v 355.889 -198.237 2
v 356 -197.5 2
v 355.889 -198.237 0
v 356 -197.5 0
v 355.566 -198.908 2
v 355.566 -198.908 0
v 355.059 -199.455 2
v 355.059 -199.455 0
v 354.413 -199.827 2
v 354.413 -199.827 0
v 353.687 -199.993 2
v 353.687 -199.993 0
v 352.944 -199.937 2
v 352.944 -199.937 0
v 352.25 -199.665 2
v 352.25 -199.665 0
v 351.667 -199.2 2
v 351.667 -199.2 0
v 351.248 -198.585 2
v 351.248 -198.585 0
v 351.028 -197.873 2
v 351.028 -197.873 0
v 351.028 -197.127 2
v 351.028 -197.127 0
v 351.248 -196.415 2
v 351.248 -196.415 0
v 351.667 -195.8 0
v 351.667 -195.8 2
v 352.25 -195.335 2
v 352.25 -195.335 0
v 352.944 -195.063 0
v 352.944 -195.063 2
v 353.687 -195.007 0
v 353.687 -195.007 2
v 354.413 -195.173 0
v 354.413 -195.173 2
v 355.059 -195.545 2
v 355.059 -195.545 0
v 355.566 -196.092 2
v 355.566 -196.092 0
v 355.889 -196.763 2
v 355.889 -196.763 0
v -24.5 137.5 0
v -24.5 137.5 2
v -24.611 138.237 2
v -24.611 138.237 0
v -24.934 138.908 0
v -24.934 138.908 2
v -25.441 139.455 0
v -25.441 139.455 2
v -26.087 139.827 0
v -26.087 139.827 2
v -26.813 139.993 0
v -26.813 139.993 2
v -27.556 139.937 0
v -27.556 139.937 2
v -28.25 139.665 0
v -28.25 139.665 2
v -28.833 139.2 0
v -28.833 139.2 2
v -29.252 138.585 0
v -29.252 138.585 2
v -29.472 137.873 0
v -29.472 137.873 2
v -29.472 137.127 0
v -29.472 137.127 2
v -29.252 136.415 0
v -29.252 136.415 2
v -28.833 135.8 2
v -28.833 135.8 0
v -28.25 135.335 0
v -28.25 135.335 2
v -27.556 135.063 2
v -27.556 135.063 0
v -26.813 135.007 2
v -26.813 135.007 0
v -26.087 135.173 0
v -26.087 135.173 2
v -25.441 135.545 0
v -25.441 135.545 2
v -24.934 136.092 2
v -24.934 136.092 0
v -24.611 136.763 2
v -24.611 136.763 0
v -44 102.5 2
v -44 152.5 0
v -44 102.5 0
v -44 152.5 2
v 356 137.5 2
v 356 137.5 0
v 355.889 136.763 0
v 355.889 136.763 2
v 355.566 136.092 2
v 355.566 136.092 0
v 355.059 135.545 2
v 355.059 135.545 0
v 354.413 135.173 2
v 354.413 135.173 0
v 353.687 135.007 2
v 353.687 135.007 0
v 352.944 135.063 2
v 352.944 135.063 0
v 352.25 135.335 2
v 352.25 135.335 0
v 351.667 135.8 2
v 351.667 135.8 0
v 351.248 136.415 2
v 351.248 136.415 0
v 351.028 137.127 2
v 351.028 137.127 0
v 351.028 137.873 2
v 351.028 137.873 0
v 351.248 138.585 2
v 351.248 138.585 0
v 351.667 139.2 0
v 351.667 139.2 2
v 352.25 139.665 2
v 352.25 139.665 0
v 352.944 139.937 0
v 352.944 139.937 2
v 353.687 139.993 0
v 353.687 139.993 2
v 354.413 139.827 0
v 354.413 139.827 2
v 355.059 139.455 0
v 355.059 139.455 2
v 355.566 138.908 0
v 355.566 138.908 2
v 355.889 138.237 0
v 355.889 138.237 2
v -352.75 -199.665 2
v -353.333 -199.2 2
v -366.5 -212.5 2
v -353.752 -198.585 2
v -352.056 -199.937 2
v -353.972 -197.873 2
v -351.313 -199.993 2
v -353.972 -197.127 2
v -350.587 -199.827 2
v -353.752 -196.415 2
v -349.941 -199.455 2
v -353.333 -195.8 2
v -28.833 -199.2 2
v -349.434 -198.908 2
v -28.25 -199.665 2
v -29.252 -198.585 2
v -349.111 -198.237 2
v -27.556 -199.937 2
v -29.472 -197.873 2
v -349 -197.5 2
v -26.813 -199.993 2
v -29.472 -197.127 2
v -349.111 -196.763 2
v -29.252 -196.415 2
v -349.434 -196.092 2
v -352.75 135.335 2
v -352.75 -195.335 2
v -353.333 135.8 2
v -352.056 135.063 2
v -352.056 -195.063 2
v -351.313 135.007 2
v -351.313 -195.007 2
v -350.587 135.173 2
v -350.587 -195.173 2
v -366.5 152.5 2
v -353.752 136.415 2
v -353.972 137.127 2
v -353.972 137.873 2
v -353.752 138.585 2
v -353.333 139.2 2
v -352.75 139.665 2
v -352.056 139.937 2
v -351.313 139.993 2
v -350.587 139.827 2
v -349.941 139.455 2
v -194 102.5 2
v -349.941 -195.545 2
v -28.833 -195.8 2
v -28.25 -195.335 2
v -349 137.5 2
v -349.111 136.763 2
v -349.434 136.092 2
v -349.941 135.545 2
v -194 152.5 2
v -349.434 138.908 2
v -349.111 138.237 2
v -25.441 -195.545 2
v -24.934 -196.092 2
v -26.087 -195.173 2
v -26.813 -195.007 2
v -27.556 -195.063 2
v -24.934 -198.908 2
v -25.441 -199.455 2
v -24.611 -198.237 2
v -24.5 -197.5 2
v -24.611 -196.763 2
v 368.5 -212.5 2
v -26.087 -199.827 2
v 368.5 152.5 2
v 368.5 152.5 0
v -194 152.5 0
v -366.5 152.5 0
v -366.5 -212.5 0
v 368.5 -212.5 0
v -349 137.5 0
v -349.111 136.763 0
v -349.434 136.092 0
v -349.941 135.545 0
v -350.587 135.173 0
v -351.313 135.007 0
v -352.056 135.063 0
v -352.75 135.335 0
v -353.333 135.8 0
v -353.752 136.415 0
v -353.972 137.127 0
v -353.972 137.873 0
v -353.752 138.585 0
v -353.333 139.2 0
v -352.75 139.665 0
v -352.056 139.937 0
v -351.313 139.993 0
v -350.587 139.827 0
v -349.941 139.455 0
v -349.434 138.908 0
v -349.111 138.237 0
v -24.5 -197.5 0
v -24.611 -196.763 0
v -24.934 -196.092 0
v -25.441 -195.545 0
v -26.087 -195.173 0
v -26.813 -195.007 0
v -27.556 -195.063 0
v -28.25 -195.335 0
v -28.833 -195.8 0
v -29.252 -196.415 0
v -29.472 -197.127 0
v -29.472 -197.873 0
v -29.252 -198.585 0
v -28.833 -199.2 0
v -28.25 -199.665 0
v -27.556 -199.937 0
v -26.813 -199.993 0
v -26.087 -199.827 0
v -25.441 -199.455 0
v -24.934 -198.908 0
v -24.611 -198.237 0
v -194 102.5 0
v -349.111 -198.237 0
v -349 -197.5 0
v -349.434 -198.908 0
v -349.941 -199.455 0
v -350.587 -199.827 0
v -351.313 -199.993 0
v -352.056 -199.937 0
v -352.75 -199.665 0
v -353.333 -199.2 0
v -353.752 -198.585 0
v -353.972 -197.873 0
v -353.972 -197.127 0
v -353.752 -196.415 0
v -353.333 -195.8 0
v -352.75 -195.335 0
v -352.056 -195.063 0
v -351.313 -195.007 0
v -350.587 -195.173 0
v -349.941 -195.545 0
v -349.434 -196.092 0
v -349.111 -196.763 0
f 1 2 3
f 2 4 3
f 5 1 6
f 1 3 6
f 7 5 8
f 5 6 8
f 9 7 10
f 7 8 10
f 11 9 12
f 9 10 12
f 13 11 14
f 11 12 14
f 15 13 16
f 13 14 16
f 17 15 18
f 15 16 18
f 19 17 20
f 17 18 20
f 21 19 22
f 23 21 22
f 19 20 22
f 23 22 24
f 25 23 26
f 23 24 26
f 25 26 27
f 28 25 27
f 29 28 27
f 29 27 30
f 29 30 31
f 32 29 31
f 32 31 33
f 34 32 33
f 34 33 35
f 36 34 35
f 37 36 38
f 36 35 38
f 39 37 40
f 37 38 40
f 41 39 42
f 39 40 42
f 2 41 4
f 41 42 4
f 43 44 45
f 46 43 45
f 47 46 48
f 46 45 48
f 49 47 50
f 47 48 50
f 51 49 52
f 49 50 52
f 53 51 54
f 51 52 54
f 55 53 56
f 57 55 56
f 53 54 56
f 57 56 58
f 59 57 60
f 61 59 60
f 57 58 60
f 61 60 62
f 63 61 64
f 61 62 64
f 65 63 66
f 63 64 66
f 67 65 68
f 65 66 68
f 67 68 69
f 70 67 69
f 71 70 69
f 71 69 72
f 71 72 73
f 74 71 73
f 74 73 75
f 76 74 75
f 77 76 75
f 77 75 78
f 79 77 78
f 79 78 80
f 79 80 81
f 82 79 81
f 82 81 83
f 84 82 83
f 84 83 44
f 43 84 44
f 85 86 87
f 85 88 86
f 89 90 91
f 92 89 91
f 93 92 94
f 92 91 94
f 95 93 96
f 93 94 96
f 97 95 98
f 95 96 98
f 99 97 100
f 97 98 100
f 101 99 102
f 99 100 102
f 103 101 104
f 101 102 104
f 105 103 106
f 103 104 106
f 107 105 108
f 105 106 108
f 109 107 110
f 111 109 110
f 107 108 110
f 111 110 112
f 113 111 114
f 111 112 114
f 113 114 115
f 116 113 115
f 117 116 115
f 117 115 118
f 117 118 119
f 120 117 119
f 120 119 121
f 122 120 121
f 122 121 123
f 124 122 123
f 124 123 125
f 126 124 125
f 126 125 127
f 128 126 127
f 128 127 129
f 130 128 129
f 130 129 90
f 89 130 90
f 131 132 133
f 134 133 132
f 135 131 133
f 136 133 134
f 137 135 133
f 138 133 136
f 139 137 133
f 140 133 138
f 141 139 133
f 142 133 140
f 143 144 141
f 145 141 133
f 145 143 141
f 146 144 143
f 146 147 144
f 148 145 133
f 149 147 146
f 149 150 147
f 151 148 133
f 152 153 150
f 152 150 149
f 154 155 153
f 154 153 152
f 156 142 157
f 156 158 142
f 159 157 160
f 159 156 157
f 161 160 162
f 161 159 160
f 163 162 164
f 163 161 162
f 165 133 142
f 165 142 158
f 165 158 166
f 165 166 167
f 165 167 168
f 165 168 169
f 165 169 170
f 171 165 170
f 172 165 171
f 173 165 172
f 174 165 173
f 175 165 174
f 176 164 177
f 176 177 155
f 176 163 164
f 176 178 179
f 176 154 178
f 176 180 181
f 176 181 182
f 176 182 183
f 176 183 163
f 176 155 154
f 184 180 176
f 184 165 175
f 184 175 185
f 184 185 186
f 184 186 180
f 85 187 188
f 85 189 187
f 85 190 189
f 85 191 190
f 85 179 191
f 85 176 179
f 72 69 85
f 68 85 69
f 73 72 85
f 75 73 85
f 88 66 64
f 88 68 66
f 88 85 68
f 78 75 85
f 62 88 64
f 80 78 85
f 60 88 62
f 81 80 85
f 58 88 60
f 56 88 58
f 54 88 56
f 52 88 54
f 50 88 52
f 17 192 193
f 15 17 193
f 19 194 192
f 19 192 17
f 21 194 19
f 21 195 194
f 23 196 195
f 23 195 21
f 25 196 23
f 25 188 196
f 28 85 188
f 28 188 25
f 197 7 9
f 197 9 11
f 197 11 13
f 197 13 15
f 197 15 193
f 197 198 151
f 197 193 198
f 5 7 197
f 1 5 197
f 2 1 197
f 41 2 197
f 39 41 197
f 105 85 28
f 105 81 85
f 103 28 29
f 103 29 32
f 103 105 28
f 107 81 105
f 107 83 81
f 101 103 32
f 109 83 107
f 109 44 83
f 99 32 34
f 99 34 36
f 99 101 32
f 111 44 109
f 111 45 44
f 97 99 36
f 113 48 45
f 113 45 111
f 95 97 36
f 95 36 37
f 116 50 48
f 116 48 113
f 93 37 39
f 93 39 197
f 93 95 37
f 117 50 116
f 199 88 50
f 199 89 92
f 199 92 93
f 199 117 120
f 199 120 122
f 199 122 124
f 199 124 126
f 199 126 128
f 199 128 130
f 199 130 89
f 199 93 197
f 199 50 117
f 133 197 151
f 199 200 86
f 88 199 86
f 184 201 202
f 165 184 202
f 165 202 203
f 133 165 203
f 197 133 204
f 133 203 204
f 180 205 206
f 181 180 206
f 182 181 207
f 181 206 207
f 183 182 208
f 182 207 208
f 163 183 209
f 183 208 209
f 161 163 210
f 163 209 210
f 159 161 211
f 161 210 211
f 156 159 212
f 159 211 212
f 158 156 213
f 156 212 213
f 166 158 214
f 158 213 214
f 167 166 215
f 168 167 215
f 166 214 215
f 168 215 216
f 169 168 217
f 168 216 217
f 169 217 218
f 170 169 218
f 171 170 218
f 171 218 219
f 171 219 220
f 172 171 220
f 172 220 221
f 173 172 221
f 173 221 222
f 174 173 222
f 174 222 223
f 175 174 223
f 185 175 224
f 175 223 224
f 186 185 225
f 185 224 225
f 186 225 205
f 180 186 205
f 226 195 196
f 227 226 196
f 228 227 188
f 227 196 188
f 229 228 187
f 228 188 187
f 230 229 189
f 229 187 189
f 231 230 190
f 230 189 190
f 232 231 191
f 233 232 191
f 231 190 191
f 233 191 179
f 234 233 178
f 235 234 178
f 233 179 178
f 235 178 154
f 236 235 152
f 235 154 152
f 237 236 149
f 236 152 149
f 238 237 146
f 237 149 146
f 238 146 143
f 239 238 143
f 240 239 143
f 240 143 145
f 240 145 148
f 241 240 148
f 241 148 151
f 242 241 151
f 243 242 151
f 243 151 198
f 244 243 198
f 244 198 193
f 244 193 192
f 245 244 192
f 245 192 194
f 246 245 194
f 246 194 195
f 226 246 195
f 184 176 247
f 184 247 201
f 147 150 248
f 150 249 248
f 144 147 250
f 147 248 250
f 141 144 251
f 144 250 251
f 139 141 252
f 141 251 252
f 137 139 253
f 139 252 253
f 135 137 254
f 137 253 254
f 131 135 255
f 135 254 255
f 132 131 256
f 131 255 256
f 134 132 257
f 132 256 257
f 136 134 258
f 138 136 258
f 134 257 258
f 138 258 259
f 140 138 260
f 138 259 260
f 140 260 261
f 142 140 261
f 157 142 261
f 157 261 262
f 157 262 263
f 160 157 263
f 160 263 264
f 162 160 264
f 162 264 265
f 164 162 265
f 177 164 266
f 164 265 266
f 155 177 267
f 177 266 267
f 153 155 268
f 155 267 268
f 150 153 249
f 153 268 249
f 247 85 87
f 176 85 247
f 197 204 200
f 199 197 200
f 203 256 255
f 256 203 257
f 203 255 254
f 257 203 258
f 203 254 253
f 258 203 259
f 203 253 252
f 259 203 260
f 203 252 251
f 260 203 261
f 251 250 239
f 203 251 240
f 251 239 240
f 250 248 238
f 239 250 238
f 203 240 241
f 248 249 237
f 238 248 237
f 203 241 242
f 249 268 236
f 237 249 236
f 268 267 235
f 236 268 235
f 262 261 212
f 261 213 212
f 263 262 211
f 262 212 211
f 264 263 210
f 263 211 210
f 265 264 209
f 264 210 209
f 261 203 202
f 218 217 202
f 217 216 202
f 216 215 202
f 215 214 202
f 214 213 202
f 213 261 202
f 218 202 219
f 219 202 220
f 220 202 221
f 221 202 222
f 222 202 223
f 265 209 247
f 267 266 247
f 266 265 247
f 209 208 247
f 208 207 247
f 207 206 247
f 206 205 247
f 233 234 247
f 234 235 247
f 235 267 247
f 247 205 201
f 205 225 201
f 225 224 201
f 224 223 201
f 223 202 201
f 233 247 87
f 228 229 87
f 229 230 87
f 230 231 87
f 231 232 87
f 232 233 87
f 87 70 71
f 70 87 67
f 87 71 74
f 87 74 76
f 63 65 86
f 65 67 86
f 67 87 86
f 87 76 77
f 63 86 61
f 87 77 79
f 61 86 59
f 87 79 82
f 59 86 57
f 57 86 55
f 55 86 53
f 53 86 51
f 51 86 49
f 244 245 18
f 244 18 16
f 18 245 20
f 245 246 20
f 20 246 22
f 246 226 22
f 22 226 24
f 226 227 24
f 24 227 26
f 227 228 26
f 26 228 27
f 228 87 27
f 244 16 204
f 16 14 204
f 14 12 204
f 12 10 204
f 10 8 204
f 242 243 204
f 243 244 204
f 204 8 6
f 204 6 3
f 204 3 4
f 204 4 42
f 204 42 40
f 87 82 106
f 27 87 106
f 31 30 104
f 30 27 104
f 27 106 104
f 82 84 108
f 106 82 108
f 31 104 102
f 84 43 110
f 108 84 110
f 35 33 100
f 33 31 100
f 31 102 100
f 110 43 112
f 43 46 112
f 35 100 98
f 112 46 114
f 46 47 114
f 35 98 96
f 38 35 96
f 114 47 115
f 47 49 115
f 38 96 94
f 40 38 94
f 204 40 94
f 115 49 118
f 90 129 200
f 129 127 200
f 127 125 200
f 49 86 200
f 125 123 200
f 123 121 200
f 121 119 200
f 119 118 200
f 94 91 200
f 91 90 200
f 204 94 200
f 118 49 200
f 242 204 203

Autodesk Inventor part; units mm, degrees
ref_plane "YZ Plane" through (0, 0, 0) normal (1, 0, 0) x (0, 1, 0)
ref_plane "XZ Plane" through (0, 0, 0) normal (0, 1, 0) x (-1, 0, 0)
ref_plane "XY Plane" through (0, 0, 0) normal (0, 0, 1) x (1, 0, 0)
sketch "Esquisse1" plane through (0, 0, 0) normal (0, 0, 1) x (1, 0, 0)
  line L0 (-366.5, -212.5) -> (368.5, -212.5)
  line L1 (368.5, -212.5) -> (368.5, 152.5)
  line L2 (368.5, 152.5) -> (-366.5, 152.5)
  line L3 (-366.5, 152.5) -> (-366.5, -212.5)
  line L4 (-366.5, -212.5) -> (368.5, 152.5) construction
  line L5 (-354, -200) -> (356, -200)
  line L6 (356, -200) -> (356, 140)
  line L7 (356, 140) -> (-354, 140)
  line L8 (-354, 140) -> (-354, -200)
  line L9 (-354, -200) -> (356, 140) construction
  circle A0 centre (-351.5, 137.5) radius 2.5
  circle A1 centre (-351.5, -197.5) radius 2.5
  circle A2 centre (353.5, -197.5) radius 2.5
  circle A3 centre (353.5, 137.5) radius 2.5
  point P0 (-354, -197.5)
  point P1 (-351.5, -200)
  point P2 (353.5, -200)
  point P3 (356, -197.5)
  point P4 (356, 137.5)
  point P5 (353.5, 140)
  point P6 (-354, 137.5)
  point P7 (-351.5, 140)
  dimension "d0" = 735
  dimension "d1" = 365
  dimension "d2" = 12.5
  dimension "d3" = 12.5
  dimension "d4" = 5
  dimension "d7" = 5
  dimension "d8" = 5
  dimension "d9" = 5
  dimension "d75" = 12.5
  dimension "d76" = 12.5
extrude "Extrusion1" add sketch "Esquisse1" along normal blind 2 contours L3 L2 L1 L0 | L8 A1 L5 | A1 L8 A0 L7 A3 L6 A2 L5 | A2 L6 L5 | L8 L7 A0 | A3 L7 L6
sketch "Esquisse3" plane through (0, 0, 2) normal (0, 0, 1) x (1, 0, 0)
  line L0 (-194, 155.1637) -> (-44, 155.1637)
  line L1 (-44, 155.1637) -> (-44, 102.5)
  line L2 (-44, 102.5) -> (-194, 102.5)
  line L3 (-194, 102.5) -> (-194, 155.1637)
  line L4 (368.5, -212.5) -> (368.5, 152.5) projected
  line L5 (368.5, 152.5) -> (-366.5, 152.5) projected
  point P0 (0, 0)
  point P1 (-44, 128.8319)
  dimension "d65" = 412.5
  dimension "d66" = 150
  dimension "d67" = 50
extrude "Extrusion2" cut sketch "Esquisse3" against normal through all
sketch "Esquisse4" plane through (0, 0, 2) normal (0, 0, 1) x (1, 0, 0)
  circle A0 centre (-27, 137.5) radius 2.5
  circle A1 centre (-27, -197.5) radius 2.5
  line L0 (-29.5, 269.4833) -> (-29.5, -384.936)
  line L1 (368.5, -212.5) -> (368.5, 152.5) projected
  circle A2 centre (-351.5, -197.5) radius 2.5 projected
  circle A3 centre (-351.5, 137.5) radius 2.5 projected
  point P0 (0, 0)
  dimension "d68" = 5
  dimension "d69" = 5
  dimension "d70" = 398
  dimension "d71" = 0
  dimension "d72" = 0
extrude "Extrusion3" cut sketch "Esquisse4" along normal through all both and the other way through all contours A0 | A1
properties part number "PlaqueLargeur"
